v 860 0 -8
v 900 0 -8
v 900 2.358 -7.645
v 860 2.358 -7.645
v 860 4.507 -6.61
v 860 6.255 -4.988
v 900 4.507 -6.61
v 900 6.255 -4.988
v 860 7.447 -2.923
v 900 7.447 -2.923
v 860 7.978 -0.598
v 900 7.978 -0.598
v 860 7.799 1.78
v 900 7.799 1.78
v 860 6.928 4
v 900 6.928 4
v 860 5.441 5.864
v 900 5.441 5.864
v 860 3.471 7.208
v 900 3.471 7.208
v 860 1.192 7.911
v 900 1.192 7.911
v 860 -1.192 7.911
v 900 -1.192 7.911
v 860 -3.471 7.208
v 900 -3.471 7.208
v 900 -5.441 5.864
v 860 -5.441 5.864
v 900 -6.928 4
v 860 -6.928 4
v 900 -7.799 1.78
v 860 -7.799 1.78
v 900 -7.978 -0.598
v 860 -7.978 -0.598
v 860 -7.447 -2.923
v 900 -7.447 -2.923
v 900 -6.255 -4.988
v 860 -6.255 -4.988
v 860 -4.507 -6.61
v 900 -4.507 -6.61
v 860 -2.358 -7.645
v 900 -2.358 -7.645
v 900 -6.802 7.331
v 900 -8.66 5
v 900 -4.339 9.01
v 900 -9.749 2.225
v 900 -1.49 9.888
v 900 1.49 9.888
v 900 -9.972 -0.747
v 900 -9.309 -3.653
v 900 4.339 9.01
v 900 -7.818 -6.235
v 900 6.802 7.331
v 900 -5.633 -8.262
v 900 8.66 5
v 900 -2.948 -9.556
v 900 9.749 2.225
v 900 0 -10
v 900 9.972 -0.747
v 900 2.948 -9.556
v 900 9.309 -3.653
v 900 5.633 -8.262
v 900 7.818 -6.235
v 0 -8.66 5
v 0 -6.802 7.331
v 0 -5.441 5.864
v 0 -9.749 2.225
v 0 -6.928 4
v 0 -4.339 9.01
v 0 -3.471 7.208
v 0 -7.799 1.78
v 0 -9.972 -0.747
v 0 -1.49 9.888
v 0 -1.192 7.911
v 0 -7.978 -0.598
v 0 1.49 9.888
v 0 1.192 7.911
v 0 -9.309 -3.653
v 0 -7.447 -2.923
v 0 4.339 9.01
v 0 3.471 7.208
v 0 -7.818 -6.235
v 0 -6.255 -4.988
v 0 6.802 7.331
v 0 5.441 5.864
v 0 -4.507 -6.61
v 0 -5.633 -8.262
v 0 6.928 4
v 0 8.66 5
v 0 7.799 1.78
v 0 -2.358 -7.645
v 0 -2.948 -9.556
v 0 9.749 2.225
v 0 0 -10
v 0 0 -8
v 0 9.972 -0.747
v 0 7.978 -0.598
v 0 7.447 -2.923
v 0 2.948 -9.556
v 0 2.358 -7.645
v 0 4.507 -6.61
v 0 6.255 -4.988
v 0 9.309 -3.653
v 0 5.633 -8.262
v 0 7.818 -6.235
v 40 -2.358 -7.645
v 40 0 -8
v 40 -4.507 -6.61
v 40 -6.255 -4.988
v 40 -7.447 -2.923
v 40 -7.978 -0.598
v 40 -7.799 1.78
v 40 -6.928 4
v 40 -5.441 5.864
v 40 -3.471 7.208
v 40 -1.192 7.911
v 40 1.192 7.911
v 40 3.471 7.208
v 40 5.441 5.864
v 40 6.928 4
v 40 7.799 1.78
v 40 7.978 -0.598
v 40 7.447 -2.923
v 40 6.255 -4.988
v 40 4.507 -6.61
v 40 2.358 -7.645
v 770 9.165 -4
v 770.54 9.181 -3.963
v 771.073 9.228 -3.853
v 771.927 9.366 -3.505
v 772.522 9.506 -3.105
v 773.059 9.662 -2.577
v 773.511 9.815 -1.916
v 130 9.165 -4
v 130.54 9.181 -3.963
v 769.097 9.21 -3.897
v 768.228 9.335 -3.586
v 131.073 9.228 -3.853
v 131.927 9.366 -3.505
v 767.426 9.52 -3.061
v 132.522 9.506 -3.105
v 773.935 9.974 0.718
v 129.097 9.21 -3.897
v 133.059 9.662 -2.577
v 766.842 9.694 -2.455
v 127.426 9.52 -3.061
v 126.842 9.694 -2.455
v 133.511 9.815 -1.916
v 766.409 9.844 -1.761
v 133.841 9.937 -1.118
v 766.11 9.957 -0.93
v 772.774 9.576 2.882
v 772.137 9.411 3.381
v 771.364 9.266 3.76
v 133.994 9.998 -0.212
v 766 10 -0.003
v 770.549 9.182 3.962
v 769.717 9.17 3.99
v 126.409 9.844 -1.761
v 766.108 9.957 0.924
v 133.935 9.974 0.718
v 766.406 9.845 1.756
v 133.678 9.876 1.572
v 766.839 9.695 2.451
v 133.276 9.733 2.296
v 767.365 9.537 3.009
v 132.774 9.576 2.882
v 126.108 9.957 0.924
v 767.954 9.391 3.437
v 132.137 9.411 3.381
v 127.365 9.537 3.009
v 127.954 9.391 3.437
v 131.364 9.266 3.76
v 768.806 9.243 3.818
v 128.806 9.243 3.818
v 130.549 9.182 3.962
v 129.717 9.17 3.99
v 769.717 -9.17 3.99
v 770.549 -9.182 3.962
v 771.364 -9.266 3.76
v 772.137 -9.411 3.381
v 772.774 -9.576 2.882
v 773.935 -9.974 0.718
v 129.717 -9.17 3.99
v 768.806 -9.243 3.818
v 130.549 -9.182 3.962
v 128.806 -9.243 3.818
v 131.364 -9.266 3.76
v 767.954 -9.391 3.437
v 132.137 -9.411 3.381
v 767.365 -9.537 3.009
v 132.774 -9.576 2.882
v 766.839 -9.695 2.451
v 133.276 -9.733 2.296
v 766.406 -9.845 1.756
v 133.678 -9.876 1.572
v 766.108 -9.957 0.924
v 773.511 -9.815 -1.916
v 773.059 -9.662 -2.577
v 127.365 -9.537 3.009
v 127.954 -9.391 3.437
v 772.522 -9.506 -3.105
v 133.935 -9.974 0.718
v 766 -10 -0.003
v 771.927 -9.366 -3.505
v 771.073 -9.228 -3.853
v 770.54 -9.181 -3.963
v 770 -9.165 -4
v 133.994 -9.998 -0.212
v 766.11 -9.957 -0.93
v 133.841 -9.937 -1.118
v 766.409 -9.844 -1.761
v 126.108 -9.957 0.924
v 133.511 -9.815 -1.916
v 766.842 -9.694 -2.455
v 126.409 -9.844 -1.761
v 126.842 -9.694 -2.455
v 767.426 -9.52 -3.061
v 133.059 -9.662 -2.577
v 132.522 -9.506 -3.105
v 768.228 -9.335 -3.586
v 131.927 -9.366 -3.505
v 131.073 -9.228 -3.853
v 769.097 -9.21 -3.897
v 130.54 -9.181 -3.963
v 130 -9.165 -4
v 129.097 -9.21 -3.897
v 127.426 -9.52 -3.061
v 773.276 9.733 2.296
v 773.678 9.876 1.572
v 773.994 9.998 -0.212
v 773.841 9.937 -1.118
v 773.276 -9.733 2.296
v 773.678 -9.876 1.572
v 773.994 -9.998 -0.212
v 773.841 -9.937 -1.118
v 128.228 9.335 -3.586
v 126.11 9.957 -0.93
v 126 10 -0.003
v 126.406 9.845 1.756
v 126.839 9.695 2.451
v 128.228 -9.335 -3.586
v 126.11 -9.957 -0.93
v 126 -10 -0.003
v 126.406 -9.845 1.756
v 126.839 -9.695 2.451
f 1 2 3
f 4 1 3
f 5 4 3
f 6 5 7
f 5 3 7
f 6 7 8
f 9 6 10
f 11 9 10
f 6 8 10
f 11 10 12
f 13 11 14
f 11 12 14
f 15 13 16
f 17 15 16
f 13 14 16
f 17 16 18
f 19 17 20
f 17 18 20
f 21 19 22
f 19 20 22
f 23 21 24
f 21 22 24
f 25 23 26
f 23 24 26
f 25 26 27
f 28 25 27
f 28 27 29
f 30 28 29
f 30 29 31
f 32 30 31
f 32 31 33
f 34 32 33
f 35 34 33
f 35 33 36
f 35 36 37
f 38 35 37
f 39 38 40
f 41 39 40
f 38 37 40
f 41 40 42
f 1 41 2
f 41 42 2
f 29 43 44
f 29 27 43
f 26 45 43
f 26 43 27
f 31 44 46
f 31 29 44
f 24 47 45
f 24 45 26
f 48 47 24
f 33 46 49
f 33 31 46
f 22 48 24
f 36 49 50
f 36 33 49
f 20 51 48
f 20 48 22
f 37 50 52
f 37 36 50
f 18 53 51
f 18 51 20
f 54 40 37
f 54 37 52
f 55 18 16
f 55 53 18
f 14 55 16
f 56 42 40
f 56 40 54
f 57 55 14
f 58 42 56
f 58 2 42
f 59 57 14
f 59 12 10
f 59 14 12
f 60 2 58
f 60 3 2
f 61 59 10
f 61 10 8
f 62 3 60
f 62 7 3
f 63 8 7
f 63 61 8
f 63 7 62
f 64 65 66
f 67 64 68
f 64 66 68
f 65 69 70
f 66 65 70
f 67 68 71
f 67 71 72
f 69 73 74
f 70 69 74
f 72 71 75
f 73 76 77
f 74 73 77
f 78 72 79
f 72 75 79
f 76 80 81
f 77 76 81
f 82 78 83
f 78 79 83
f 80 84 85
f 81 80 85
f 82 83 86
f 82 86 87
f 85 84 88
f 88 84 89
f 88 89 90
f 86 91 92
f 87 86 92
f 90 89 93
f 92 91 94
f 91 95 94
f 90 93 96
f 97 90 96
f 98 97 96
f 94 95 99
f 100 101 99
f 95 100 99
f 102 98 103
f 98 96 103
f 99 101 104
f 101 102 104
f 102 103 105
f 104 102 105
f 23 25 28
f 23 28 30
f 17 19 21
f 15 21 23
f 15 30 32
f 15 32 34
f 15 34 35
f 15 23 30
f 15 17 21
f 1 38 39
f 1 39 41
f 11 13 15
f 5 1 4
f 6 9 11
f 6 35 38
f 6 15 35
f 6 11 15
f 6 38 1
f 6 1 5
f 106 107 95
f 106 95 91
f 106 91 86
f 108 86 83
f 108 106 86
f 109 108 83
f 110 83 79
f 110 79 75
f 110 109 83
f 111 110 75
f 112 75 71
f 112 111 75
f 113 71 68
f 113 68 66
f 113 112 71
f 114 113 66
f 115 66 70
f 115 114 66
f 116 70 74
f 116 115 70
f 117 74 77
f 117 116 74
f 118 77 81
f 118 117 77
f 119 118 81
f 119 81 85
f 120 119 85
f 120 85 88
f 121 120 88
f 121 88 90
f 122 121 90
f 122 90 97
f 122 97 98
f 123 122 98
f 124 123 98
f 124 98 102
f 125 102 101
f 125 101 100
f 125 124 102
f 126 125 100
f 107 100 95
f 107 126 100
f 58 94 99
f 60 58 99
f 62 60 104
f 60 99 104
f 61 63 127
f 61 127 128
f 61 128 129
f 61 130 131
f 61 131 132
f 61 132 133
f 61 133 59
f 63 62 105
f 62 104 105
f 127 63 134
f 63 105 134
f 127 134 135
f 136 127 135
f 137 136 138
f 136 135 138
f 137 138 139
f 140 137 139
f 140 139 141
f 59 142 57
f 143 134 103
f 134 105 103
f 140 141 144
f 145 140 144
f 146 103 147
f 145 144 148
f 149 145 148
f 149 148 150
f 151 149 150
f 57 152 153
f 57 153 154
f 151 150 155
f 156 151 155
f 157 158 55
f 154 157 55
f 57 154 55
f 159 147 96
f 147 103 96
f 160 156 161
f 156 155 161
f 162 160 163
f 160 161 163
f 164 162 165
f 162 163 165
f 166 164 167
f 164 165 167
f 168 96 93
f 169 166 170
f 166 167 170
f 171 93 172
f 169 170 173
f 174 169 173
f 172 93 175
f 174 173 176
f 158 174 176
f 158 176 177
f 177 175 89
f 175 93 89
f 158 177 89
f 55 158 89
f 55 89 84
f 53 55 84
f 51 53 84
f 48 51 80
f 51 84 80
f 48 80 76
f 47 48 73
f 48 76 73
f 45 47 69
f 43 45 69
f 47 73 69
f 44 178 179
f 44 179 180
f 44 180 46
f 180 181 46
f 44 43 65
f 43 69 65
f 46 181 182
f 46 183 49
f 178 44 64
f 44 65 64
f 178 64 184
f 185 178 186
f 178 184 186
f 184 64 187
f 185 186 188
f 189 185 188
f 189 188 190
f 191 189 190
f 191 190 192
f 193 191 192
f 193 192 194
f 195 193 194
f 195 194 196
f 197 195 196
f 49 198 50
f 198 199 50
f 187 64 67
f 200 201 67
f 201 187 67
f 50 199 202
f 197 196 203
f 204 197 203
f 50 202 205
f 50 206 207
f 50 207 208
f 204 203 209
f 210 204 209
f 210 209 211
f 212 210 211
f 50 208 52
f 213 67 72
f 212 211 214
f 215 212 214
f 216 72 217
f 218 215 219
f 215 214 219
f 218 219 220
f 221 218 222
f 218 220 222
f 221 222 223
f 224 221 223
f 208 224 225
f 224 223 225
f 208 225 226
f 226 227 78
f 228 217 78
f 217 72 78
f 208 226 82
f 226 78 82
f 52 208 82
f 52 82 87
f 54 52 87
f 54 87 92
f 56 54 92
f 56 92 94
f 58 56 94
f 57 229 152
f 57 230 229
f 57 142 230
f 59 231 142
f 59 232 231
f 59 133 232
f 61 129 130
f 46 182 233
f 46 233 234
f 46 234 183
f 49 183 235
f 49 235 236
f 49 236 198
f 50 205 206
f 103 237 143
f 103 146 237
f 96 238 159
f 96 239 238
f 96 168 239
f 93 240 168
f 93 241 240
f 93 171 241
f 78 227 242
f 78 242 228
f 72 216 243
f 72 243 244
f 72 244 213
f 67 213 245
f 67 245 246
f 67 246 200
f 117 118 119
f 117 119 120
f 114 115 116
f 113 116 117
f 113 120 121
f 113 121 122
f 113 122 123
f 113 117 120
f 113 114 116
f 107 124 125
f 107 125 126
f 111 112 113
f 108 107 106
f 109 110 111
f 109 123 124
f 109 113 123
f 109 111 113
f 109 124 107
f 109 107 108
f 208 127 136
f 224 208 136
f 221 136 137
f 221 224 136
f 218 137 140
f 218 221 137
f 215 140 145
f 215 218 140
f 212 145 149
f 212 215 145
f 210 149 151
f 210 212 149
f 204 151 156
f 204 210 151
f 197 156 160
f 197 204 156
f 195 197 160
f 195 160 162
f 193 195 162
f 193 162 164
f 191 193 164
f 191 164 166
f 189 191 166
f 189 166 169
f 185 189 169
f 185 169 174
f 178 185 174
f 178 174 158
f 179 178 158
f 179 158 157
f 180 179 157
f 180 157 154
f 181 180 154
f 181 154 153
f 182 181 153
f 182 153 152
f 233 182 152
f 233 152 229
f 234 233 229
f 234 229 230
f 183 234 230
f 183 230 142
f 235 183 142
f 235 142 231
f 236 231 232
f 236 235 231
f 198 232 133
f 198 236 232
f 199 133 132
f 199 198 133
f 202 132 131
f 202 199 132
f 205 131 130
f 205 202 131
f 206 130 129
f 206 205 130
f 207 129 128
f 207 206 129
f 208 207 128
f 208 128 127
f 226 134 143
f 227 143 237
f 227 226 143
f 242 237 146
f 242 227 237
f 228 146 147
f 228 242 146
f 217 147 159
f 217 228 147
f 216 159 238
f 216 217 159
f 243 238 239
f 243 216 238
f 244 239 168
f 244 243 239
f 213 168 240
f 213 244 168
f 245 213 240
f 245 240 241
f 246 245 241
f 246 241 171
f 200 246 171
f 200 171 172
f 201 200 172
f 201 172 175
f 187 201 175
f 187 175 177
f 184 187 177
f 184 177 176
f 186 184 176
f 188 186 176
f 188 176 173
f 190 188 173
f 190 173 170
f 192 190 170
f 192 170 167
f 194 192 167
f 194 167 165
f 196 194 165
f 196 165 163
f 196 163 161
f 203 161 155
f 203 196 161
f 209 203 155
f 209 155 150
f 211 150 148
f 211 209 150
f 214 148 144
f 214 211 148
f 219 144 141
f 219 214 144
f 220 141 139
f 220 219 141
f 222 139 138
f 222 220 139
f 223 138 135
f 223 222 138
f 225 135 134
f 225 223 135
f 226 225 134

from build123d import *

# Parameters (mm, degrees)
SKETCH1_R               = 10
BOSS_EXTRUDE1_DEPTH     = 900
SKETCH2_R               = 8
CUT_EXTRUDE1_DEPTH      = 40
CUT_EXTRUDE2_START      = -40
SKETCH3_R               = 8
CUT_EXTRUDE2_DEPTH      = 40
CUT_EXTRUDE3_DEPTH      = 40
CUT_EXTRUDE3_DEPTH_BACK = 40
SKETCH4_R               = 4


with BuildPart() as part:
    # Sketch1 → Boss-Extrude1 (new body)
    with BuildSketch(Plane.YZ):
        Circle(SKETCH1_R)
    extrude(amount=BOSS_EXTRUDE1_DEPTH)

    # Sketch2 → Cut-Extrude1 (cut)
    with BuildSketch(Plane.YZ.offset(900)):
        Circle(SKETCH2_R)
    extrude(amount=-CUT_EXTRUDE1_DEPTH, mode=Mode.SUBTRACT)

    # Sketch3 → Cut-Extrude2 (cut)
    with BuildSketch(Plane(origin=(0, 0, 0), x_dir=(0, -1, 0), z_dir=(-1, 0, 0)).offset(CUT_EXTRUDE2_START)):
        Circle(SKETCH3_R)
    extrude(amount=CUT_EXTRUDE2_DEPTH, mode=Mode.SUBTRACT)

    # Sketch4 → Cut-Extrude3 (cut, two sides: drawn at the far end of the back side and taken through both)
    with BuildSketch(Plane(origin=(0, 0, 0), x_dir=(-1, 0, 0), z_dir=(0, 1, 0)).offset(-CUT_EXTRUDE3_DEPTH_BACK)):
        with Locations((-130, 0)):
            Circle(SKETCH4_R)
        with Locations((-770, 0)):
            Circle(SKETCH4_R)
    extrude(amount=CUT_EXTRUDE3_DEPTH + CUT_EXTRUDE3_DEPTH_BACK, mode=Mode.SUBTRACT)


solid = part.part
